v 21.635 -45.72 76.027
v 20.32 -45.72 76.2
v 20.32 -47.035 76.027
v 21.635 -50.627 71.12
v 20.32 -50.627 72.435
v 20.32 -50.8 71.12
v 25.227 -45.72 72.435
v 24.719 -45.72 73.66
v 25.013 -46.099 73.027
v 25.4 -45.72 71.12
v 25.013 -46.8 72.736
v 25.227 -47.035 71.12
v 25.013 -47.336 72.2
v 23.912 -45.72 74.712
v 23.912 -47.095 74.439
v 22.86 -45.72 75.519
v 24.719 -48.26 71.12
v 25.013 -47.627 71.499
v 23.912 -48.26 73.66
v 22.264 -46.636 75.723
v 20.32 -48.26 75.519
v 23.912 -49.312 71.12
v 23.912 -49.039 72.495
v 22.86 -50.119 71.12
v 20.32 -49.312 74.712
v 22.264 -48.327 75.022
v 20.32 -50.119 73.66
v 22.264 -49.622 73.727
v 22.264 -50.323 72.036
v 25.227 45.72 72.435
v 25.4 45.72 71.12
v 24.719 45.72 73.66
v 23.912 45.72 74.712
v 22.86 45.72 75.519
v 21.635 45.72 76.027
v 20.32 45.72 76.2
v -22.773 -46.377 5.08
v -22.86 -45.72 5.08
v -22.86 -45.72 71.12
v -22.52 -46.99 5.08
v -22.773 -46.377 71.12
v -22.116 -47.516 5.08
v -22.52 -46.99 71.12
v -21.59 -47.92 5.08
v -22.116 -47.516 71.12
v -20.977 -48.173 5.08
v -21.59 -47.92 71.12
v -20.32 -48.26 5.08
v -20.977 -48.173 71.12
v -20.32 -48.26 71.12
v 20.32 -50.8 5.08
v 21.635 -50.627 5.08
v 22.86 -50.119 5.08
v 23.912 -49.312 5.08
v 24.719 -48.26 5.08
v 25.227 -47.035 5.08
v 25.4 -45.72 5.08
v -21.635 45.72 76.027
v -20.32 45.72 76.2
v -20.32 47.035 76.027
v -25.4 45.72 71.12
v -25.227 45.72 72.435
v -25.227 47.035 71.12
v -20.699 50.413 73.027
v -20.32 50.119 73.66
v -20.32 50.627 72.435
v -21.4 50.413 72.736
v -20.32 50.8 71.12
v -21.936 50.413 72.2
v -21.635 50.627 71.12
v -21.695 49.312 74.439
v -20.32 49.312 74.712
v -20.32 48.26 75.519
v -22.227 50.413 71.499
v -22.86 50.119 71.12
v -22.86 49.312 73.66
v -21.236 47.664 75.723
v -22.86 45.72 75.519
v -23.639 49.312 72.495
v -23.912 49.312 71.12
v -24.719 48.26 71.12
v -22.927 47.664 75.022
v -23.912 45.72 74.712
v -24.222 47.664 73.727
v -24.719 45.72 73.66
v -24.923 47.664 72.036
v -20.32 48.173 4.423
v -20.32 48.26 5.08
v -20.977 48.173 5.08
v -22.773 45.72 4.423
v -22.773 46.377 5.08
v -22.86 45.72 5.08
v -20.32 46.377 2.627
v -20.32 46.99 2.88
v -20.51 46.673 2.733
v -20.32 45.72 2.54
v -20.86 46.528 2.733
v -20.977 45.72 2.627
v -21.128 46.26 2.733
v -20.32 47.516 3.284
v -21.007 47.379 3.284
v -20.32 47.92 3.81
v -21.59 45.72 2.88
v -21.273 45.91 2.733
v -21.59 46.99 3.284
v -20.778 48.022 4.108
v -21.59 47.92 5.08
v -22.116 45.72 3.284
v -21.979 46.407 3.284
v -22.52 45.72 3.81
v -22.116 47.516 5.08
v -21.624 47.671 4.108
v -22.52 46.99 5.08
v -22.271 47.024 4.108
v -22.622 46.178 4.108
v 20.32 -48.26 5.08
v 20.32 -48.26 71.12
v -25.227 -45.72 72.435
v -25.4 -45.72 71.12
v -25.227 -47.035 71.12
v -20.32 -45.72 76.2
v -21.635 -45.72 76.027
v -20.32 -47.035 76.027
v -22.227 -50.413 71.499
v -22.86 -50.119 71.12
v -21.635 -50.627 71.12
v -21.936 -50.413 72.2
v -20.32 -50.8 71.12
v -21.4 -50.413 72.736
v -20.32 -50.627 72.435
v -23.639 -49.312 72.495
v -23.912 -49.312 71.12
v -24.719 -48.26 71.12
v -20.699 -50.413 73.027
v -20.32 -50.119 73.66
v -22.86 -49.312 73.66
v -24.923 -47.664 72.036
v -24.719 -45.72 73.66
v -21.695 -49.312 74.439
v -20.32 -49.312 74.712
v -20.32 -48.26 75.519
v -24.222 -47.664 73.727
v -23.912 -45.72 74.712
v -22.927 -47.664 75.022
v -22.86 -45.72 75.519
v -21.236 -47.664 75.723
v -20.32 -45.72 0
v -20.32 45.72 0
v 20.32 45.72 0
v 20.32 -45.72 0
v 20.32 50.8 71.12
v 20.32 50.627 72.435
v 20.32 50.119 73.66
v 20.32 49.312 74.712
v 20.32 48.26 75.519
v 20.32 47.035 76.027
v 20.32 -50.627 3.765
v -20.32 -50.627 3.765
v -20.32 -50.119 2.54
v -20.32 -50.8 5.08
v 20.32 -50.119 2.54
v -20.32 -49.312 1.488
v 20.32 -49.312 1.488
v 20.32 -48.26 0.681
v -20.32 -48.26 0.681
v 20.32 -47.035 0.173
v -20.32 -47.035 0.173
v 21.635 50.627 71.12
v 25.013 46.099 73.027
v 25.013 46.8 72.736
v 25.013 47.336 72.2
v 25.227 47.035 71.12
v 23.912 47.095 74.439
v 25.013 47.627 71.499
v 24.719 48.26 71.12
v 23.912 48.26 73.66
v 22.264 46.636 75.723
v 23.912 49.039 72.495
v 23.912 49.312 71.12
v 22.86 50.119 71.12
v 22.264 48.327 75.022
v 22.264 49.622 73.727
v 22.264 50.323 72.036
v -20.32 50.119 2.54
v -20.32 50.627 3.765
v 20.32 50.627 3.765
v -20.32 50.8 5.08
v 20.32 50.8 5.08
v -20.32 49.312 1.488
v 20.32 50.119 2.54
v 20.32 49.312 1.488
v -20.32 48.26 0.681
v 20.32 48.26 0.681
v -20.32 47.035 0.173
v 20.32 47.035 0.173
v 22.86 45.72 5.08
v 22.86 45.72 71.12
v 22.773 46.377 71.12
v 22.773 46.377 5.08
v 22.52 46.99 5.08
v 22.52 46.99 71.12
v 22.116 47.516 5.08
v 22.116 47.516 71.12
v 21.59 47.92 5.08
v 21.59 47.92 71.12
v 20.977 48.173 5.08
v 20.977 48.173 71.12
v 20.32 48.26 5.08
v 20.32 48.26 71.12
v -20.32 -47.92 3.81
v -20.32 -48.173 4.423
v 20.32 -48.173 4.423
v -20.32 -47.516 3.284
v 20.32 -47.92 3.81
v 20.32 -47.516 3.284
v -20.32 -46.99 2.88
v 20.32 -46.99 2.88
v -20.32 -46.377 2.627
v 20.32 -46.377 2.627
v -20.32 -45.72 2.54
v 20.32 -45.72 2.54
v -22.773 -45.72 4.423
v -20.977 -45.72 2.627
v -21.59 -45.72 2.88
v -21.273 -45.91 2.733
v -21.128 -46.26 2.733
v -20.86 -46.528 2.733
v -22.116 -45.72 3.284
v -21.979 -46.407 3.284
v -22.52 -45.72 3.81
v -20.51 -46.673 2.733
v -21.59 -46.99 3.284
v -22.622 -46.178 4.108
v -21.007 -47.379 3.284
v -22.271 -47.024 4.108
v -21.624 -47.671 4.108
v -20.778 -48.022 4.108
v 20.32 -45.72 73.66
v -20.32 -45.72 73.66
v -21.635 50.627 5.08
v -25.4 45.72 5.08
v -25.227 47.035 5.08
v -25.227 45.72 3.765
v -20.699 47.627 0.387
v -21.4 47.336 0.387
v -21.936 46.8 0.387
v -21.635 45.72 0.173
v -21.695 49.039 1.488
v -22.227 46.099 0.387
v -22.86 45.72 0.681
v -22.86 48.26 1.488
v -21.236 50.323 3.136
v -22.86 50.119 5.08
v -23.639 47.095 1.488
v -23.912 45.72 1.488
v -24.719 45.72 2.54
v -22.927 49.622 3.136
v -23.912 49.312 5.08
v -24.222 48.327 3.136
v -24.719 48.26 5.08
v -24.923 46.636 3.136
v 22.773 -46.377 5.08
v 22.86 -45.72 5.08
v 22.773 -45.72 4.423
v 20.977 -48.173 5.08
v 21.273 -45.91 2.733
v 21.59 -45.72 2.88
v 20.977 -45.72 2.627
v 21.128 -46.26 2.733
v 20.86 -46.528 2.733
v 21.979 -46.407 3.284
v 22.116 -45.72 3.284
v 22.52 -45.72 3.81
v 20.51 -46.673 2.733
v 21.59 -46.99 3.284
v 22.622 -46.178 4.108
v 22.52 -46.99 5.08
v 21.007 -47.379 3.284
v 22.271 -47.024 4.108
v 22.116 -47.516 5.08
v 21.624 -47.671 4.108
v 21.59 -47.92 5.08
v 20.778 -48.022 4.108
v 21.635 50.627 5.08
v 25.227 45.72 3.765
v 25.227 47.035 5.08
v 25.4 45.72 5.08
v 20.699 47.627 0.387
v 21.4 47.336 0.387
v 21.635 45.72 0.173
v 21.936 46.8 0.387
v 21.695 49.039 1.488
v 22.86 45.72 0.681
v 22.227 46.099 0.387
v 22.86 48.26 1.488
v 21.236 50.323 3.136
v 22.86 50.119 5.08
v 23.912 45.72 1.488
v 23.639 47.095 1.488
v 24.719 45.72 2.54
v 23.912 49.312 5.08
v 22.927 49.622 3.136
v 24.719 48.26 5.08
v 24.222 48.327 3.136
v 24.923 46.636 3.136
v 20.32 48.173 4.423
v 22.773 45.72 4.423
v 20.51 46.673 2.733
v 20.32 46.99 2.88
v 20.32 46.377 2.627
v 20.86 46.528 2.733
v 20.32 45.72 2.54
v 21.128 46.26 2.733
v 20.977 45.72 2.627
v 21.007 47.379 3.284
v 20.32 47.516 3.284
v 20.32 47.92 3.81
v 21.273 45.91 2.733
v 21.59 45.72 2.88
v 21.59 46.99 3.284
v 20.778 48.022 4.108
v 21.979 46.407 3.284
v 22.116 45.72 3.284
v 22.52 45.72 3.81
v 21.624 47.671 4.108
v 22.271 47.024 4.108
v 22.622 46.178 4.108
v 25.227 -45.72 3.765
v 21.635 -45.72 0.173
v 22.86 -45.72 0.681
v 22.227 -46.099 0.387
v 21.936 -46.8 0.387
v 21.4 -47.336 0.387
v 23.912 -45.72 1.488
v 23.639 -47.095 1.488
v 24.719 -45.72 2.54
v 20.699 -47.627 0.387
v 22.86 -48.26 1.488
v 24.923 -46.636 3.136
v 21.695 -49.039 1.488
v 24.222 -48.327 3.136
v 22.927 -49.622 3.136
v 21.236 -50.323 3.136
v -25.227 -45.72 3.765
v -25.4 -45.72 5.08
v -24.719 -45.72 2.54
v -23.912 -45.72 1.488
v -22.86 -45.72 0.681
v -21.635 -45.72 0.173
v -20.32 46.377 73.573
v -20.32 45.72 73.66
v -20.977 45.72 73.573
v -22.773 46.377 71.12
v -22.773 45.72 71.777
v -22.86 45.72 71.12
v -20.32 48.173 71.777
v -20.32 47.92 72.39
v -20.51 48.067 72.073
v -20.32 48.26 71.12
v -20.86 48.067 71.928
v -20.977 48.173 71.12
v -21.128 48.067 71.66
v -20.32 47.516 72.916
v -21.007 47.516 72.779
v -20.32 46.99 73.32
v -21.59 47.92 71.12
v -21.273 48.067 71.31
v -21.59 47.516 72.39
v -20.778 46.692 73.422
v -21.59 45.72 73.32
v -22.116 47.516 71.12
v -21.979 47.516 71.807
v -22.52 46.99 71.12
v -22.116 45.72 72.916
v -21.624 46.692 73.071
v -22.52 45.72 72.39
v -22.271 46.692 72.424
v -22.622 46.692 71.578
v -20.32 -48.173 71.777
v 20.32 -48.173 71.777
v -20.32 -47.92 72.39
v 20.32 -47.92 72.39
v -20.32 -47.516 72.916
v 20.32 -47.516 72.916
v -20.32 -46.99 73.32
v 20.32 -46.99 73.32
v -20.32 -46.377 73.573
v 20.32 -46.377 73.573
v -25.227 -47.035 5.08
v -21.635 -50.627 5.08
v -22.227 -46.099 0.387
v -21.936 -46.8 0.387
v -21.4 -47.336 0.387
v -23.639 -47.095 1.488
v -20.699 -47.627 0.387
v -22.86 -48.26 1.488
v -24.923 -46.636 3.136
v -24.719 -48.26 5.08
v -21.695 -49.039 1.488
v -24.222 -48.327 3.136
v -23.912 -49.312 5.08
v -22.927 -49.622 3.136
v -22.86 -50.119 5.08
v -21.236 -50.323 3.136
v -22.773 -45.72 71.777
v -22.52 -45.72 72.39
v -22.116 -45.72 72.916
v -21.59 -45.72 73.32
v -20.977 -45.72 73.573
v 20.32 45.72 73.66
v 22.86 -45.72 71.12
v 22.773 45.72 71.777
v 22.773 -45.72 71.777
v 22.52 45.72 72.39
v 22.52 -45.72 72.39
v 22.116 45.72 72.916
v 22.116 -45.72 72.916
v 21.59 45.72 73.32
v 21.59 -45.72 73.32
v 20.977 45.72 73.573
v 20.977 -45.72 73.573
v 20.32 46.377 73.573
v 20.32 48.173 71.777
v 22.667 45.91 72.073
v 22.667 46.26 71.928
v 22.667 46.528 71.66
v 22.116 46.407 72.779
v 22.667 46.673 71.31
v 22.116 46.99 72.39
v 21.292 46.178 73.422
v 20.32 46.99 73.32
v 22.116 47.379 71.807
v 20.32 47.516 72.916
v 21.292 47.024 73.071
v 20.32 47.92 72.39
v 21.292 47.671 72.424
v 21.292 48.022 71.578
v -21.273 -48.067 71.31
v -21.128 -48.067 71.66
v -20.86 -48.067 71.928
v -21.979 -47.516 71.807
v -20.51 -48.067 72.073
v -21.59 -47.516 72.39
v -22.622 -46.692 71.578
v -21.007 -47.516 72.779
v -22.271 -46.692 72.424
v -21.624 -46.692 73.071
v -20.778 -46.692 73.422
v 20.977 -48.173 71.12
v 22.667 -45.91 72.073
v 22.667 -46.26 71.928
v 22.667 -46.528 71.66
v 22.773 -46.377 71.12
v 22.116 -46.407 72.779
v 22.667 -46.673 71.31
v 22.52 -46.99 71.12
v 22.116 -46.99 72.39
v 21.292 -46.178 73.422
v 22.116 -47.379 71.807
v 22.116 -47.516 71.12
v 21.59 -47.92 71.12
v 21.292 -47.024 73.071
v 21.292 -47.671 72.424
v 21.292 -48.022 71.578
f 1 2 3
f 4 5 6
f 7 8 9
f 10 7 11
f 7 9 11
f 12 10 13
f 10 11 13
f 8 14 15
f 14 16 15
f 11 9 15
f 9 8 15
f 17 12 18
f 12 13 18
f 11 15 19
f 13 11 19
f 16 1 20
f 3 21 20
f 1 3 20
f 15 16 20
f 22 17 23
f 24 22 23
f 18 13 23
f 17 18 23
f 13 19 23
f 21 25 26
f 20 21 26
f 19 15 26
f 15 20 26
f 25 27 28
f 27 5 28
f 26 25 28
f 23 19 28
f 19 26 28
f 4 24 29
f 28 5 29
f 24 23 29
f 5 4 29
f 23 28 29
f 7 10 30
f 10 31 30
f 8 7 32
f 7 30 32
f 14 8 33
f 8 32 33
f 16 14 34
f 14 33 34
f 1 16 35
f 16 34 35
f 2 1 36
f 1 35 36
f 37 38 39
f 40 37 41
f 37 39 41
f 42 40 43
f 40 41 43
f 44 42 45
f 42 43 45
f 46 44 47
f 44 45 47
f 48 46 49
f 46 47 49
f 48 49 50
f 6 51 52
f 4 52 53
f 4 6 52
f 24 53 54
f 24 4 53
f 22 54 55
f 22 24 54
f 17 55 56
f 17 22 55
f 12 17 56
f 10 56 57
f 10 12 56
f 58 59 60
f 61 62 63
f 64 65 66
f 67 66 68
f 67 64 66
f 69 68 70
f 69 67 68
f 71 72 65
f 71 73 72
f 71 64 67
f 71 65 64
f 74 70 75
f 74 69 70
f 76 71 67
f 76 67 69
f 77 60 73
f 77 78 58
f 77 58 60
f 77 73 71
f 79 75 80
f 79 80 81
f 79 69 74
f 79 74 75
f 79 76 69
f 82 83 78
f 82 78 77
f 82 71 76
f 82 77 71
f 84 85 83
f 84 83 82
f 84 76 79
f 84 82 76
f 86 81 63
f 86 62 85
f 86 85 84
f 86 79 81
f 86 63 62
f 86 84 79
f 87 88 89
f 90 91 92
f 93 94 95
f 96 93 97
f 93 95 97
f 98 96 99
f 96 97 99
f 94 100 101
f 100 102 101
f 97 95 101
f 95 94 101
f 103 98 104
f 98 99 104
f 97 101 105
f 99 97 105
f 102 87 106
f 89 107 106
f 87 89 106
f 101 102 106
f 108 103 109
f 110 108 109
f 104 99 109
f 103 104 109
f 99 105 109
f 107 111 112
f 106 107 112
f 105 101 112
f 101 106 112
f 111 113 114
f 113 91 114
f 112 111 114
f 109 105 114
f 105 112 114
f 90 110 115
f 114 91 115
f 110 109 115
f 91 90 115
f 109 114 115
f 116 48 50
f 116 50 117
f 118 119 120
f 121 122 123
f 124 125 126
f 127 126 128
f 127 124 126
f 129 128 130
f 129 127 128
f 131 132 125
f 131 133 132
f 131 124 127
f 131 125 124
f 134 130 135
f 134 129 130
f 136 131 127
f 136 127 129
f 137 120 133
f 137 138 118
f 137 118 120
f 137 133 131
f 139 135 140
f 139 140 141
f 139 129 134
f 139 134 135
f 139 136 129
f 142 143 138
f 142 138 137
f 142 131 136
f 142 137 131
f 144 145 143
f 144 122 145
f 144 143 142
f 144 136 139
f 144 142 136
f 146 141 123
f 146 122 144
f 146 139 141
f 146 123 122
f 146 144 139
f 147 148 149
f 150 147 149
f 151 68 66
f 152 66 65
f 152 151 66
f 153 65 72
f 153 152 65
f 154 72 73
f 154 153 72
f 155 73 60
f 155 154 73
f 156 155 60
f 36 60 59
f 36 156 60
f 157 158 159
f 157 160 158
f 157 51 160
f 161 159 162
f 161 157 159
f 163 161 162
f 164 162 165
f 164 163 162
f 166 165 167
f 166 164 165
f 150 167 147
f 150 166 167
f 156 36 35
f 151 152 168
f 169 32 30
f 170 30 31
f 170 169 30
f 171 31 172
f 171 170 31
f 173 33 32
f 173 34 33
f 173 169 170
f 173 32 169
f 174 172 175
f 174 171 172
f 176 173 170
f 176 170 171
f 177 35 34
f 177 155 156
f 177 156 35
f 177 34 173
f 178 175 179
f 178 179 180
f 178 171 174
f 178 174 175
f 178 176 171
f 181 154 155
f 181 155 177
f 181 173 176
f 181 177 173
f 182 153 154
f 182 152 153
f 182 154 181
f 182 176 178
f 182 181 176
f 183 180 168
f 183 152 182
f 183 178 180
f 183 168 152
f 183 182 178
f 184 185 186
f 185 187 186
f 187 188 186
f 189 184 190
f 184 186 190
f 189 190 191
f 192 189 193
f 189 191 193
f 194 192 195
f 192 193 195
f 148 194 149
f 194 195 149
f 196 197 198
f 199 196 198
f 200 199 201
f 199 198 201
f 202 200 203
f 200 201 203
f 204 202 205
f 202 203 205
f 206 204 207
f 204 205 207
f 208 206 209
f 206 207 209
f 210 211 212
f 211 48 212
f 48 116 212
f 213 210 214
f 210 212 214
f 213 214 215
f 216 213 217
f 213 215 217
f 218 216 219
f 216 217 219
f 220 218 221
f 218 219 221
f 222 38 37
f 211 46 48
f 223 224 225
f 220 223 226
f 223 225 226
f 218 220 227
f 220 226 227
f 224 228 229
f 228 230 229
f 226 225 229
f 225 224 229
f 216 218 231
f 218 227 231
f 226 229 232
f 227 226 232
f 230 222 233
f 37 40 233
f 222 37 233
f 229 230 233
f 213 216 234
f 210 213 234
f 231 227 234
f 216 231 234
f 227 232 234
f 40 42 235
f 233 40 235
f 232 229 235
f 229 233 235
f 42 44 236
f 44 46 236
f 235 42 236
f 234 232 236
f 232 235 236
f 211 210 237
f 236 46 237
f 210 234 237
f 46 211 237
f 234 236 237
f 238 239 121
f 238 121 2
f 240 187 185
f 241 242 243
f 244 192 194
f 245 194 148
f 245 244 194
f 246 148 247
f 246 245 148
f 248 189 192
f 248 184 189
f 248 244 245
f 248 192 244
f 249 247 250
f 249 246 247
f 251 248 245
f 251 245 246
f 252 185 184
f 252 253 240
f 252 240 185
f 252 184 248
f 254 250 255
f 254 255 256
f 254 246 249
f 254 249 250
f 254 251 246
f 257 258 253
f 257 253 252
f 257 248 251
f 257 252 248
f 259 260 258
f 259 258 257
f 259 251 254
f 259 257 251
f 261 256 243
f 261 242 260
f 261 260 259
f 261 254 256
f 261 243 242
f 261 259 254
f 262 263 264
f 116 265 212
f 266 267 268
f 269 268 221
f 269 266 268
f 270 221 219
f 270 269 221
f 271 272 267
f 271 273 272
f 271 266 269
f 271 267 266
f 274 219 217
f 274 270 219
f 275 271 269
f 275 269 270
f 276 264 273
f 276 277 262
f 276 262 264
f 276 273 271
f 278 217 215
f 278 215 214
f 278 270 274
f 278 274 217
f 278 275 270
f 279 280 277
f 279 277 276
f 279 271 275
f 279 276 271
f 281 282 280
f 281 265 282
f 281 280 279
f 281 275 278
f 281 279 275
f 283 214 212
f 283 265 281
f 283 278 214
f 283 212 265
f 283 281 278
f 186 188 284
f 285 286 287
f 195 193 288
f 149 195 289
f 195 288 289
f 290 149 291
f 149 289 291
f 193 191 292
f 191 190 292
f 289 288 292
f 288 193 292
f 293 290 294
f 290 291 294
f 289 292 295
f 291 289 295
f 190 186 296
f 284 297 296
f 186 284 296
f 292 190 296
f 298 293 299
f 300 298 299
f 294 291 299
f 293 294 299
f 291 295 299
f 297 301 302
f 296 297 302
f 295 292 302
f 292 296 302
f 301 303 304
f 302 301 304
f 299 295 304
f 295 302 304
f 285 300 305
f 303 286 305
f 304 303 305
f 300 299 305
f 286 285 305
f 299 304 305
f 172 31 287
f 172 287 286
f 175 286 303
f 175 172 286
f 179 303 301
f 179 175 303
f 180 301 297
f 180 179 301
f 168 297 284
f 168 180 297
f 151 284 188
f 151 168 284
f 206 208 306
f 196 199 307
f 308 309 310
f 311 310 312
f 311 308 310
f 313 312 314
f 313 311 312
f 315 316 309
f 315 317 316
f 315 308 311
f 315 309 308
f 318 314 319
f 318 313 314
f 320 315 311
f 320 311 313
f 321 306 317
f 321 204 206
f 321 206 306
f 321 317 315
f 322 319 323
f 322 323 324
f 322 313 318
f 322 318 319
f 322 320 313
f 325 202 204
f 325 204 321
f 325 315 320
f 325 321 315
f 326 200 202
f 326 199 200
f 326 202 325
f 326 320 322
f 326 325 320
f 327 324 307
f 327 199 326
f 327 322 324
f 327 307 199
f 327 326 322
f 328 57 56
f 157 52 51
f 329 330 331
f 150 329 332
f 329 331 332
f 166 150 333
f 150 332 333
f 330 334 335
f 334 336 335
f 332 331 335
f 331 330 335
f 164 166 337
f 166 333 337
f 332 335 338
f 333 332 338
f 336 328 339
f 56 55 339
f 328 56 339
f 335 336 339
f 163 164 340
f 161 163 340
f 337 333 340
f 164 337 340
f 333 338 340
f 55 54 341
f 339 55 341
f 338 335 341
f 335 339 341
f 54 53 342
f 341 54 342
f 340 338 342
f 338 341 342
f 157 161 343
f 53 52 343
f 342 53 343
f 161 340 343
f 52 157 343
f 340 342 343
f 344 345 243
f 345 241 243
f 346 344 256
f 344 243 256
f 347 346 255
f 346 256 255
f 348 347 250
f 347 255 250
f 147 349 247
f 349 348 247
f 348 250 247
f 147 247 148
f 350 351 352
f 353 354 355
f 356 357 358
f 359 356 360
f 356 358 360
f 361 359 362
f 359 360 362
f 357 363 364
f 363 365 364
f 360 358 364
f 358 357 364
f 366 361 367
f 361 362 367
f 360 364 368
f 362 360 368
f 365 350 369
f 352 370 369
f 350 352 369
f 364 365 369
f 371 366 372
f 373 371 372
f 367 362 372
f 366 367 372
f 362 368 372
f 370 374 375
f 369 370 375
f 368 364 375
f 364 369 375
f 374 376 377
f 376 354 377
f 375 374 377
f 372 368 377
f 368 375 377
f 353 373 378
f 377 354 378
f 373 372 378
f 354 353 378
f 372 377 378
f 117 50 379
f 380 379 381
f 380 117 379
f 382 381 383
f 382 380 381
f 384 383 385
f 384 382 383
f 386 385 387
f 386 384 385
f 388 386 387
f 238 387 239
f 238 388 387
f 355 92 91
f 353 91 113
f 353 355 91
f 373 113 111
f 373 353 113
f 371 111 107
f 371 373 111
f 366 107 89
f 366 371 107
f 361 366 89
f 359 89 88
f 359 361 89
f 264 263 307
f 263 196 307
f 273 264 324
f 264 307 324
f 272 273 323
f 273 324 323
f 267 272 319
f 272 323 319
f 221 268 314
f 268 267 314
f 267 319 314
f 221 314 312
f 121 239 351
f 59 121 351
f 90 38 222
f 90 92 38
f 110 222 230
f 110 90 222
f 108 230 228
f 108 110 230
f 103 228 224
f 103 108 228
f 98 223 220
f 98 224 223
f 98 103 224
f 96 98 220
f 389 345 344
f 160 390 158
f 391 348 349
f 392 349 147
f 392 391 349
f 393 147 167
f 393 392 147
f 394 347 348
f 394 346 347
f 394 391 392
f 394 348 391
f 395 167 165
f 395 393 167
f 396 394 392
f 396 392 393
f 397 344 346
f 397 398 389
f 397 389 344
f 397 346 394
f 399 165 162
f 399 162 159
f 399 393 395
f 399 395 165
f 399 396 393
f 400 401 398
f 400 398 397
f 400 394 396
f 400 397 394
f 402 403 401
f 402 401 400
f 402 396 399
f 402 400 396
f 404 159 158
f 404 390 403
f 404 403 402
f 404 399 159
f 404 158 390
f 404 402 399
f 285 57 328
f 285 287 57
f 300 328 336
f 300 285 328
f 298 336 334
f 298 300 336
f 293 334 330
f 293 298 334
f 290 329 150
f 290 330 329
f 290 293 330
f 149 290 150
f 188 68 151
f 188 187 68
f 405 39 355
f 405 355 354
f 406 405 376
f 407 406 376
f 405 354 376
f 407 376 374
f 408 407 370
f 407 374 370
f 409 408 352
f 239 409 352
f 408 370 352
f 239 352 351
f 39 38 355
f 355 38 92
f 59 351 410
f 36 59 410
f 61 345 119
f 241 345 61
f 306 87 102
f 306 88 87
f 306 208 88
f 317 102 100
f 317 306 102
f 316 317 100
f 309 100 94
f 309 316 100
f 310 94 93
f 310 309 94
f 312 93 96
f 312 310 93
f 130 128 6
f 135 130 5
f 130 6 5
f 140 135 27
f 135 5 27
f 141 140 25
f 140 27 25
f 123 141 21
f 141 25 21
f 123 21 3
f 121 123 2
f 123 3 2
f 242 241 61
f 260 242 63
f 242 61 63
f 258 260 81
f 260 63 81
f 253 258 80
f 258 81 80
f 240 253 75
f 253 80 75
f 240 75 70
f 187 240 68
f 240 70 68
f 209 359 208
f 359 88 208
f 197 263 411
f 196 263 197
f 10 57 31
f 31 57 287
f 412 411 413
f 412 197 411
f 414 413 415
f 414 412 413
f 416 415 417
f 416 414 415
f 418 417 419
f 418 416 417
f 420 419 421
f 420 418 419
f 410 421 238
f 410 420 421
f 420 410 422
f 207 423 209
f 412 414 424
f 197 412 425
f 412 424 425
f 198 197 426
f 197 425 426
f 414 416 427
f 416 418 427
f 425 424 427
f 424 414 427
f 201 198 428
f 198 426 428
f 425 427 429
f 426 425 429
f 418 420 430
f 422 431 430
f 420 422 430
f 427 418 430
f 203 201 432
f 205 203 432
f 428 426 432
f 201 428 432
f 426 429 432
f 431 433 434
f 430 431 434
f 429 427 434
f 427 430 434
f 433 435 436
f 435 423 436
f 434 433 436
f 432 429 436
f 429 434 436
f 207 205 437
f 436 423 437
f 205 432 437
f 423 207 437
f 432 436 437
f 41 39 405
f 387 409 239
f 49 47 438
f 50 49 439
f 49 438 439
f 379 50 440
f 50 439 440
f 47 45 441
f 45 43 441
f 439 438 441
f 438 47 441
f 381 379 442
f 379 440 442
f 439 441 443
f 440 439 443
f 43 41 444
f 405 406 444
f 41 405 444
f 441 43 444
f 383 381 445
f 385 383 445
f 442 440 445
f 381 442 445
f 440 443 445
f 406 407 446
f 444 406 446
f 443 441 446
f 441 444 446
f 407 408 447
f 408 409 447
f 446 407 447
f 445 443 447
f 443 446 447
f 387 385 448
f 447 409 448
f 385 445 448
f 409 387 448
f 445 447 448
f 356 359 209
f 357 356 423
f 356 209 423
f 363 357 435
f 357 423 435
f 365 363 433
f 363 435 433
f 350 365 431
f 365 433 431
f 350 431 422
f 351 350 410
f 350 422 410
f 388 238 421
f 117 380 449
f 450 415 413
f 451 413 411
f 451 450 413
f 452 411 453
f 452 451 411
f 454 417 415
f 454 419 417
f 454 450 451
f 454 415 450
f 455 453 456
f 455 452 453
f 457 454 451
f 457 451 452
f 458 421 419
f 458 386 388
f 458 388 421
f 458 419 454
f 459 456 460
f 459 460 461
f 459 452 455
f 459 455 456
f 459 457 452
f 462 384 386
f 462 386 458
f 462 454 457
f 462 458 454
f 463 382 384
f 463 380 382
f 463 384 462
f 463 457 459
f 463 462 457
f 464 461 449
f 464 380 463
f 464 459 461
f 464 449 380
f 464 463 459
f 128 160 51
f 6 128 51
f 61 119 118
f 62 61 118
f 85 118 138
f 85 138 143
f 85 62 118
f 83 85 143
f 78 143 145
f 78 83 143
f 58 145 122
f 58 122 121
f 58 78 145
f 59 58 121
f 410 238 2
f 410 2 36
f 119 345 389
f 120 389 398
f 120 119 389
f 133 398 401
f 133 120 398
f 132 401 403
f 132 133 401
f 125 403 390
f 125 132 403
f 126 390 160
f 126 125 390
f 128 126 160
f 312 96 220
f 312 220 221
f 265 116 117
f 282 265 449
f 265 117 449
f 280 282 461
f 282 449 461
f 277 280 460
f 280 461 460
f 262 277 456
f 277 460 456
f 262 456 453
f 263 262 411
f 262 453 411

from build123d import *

# Parameters (mm, degrees)
F0_W     = 50.8
F0_H     = 101.6
F1_DEPTH = 76.2
F2_R     = 5.08
F3_T     = -2.54


# Not quite as in the source:
# - a shell that OpenCascade refuses in one call is made with other operations: the cavity is built on its own and cut out


with BuildPart() as f1:
    # F0 (on Top) → F1 (new body)
    with BuildSketch(Plane.XY):
        Rectangle(F0_W, F0_H)
    extrude(amount=F1_DEPTH)

    # F2
    f2_edges = [f1.edges().sort_by_distance(p)[0] for p in [
        (-25.4, 0, 76.2),
        (0, 50.8, 76.2),
        (-25.4, 50.8, 38.1),
        (-25.4, -50.8, 38.1),
        (0, -50.8, 76.2),
        (25.4, 0, 76.2),
        (25.4, -50.8, 38.1),
        (25.4, 50.8, 38.1),
        (0, 50.8, 0),
        (25.4, 0, 0),
        (-25.4, 0, 0),
        (0, -50.8, 0),
    ]]
    fillet(f2_edges, radius=F2_R)

    # F3: a shell. OpenCascade refuses it in one call, so the cavity is built on its own and cut out:
    # the body offset inwards by the wall thickness, plus a prism from it out through each open face.
    f3_core = offset(f1.part, amount=F3_T, mode=Mode.PRIVATE)
    f3_exits = [f3_core.faces().sort_by_distance(p)[0] for p in [
        (0, 0, 73.66),
    ]]
    add(f3_core, mode=Mode.SUBTRACT)
    extrude(f3_exits, amount=-F3_T, mode=Mode.SUBTRACT)


solid = f1.part
